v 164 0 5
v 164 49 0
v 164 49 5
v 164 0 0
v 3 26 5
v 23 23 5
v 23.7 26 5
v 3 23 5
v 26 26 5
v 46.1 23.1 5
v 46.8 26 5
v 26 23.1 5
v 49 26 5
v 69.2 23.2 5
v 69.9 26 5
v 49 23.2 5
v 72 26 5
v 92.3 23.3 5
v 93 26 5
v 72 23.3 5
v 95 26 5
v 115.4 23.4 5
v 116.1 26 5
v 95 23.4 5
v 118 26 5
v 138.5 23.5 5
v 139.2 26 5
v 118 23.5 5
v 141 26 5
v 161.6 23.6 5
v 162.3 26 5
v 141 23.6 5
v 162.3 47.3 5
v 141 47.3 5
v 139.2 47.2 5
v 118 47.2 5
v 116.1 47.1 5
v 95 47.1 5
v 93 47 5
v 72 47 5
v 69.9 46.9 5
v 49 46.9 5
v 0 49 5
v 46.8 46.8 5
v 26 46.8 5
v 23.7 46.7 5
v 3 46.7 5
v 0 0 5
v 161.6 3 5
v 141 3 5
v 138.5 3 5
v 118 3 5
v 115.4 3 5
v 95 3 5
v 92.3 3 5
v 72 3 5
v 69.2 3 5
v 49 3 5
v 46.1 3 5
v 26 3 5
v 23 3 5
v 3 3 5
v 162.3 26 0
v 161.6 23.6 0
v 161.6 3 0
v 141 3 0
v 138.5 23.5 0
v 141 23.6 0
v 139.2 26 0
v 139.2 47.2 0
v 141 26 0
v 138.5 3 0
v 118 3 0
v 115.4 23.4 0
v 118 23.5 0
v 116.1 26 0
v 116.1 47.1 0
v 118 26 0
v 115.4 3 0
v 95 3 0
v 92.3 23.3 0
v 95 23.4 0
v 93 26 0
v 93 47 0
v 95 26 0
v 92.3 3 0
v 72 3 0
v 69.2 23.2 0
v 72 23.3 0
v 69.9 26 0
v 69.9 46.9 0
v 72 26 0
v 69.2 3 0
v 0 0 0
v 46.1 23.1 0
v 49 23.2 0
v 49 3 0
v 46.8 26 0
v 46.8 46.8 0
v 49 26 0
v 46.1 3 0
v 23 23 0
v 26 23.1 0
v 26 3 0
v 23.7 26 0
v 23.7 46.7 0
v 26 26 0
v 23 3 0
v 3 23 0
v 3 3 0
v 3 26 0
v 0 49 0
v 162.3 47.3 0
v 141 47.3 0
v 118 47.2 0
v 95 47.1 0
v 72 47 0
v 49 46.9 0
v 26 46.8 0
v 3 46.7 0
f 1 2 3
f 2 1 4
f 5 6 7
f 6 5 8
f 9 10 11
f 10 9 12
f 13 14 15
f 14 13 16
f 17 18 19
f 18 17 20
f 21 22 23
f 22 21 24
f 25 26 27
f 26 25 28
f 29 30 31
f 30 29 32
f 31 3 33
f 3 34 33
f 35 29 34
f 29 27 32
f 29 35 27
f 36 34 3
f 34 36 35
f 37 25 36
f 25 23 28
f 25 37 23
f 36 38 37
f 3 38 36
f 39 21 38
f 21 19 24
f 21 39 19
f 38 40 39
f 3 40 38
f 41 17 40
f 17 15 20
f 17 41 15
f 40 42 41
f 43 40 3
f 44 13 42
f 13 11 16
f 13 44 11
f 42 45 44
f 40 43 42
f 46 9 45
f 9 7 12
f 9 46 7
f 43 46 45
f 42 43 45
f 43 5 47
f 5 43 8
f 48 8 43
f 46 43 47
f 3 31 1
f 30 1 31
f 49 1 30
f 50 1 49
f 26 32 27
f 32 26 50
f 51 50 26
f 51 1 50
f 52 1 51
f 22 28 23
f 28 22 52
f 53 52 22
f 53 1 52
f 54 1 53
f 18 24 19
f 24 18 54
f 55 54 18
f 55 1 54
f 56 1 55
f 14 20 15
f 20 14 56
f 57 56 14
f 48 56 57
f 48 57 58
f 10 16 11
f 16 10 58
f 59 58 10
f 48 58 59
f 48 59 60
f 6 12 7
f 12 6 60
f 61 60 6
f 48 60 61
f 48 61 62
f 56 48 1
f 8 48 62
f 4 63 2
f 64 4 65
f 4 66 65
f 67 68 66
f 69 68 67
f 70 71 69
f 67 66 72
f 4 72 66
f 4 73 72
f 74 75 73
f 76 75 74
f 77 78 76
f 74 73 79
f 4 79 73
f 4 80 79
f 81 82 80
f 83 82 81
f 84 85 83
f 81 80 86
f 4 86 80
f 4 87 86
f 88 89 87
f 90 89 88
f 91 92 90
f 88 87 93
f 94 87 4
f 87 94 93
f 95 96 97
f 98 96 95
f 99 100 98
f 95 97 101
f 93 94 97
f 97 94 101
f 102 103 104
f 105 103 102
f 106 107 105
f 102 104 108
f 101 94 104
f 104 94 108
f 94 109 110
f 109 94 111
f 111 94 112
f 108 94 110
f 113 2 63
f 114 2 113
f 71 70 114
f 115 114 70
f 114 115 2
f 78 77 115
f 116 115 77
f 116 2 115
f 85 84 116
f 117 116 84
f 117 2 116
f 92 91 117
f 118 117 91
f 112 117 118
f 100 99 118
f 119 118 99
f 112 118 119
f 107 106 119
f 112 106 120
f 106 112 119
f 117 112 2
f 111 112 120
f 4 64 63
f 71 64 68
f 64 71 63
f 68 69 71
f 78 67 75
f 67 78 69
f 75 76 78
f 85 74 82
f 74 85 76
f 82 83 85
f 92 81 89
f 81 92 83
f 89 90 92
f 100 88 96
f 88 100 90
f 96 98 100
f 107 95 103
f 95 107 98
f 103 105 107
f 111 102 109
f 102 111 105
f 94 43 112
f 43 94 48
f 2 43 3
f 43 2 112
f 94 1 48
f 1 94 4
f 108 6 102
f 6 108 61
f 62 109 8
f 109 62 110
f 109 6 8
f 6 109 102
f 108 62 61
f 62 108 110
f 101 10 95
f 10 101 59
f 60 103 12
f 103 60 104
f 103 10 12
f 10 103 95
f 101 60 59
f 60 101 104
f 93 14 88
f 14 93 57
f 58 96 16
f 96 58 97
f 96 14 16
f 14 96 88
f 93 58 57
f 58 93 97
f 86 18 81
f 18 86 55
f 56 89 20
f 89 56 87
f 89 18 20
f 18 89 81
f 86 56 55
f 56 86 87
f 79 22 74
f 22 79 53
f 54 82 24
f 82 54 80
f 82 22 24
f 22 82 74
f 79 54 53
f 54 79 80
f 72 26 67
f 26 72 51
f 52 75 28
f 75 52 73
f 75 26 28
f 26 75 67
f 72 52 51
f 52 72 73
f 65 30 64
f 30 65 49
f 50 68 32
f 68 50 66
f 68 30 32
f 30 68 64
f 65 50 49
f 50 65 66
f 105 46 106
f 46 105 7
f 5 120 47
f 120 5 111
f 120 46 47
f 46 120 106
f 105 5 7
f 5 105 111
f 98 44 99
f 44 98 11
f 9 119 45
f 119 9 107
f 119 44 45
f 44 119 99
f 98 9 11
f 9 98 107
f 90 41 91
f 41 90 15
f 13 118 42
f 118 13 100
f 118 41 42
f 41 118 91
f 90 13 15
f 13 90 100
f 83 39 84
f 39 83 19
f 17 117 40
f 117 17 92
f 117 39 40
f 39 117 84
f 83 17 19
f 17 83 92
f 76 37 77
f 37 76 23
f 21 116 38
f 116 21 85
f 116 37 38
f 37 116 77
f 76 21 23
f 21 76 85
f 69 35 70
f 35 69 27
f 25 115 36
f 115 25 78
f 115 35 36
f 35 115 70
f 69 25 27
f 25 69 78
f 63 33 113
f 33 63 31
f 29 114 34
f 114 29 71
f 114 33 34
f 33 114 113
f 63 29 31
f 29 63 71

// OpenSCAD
w = 20;
s = 3;
num = 7;
h = 5;
inc = 0.1;

difference() {
    cube([s+(w+s)*num,w*2+3*s,h]);
    translate([s+(w+s)*0,s,0]) cube([w,w,h]);
    translate([s+(w+s)*1,s,0]) cube([w+1*inc,w+1*inc,h]);
    translate([s+(w+s)*2,s,0]) cube([w+2*inc,w+2*inc,h]);
    translate([s+(w+s)*3,s,0]) cube([w+3*inc,w+3*inc,h]);
    translate([s+(w+s)*4,s,0]) cube([w+4*inc,w+4*inc,h]);
    translate([s+(w+s)*5,s,0]) cube([w+5*inc,w+5*inc,h]);
    translate([s+(w+s)*6,s,0]) cube([w+6*inc,w+6*inc,h]);
    translate([s+(w+s)*0,w+2*s,0]) cube([w+7*inc,w+7*inc,h]);
    translate([s+(w+s)*1,w+2*s,0]) cube([w+8*inc,w+8*inc,h]);
    translate([s+(w+s)*2,w+2*s,0]) cube([w+9*inc,w+9*inc,h]);
    translate([s+(w+s)*3,w+2*s,0]) cube([w+10*inc,w+10*inc,h]);
    translate([s+(w+s)*4,w+2*s,0]) cube([w+11*inc,w+11*inc,h]);
    translate([s+(w+s)*5,w+2*s,0]) cube([w+12*inc,w+12*inc,h]);
    translate([s+(w+s)*6,w+2*s,0]) cube([w+13*inc,w+13*inc,h]);
}
